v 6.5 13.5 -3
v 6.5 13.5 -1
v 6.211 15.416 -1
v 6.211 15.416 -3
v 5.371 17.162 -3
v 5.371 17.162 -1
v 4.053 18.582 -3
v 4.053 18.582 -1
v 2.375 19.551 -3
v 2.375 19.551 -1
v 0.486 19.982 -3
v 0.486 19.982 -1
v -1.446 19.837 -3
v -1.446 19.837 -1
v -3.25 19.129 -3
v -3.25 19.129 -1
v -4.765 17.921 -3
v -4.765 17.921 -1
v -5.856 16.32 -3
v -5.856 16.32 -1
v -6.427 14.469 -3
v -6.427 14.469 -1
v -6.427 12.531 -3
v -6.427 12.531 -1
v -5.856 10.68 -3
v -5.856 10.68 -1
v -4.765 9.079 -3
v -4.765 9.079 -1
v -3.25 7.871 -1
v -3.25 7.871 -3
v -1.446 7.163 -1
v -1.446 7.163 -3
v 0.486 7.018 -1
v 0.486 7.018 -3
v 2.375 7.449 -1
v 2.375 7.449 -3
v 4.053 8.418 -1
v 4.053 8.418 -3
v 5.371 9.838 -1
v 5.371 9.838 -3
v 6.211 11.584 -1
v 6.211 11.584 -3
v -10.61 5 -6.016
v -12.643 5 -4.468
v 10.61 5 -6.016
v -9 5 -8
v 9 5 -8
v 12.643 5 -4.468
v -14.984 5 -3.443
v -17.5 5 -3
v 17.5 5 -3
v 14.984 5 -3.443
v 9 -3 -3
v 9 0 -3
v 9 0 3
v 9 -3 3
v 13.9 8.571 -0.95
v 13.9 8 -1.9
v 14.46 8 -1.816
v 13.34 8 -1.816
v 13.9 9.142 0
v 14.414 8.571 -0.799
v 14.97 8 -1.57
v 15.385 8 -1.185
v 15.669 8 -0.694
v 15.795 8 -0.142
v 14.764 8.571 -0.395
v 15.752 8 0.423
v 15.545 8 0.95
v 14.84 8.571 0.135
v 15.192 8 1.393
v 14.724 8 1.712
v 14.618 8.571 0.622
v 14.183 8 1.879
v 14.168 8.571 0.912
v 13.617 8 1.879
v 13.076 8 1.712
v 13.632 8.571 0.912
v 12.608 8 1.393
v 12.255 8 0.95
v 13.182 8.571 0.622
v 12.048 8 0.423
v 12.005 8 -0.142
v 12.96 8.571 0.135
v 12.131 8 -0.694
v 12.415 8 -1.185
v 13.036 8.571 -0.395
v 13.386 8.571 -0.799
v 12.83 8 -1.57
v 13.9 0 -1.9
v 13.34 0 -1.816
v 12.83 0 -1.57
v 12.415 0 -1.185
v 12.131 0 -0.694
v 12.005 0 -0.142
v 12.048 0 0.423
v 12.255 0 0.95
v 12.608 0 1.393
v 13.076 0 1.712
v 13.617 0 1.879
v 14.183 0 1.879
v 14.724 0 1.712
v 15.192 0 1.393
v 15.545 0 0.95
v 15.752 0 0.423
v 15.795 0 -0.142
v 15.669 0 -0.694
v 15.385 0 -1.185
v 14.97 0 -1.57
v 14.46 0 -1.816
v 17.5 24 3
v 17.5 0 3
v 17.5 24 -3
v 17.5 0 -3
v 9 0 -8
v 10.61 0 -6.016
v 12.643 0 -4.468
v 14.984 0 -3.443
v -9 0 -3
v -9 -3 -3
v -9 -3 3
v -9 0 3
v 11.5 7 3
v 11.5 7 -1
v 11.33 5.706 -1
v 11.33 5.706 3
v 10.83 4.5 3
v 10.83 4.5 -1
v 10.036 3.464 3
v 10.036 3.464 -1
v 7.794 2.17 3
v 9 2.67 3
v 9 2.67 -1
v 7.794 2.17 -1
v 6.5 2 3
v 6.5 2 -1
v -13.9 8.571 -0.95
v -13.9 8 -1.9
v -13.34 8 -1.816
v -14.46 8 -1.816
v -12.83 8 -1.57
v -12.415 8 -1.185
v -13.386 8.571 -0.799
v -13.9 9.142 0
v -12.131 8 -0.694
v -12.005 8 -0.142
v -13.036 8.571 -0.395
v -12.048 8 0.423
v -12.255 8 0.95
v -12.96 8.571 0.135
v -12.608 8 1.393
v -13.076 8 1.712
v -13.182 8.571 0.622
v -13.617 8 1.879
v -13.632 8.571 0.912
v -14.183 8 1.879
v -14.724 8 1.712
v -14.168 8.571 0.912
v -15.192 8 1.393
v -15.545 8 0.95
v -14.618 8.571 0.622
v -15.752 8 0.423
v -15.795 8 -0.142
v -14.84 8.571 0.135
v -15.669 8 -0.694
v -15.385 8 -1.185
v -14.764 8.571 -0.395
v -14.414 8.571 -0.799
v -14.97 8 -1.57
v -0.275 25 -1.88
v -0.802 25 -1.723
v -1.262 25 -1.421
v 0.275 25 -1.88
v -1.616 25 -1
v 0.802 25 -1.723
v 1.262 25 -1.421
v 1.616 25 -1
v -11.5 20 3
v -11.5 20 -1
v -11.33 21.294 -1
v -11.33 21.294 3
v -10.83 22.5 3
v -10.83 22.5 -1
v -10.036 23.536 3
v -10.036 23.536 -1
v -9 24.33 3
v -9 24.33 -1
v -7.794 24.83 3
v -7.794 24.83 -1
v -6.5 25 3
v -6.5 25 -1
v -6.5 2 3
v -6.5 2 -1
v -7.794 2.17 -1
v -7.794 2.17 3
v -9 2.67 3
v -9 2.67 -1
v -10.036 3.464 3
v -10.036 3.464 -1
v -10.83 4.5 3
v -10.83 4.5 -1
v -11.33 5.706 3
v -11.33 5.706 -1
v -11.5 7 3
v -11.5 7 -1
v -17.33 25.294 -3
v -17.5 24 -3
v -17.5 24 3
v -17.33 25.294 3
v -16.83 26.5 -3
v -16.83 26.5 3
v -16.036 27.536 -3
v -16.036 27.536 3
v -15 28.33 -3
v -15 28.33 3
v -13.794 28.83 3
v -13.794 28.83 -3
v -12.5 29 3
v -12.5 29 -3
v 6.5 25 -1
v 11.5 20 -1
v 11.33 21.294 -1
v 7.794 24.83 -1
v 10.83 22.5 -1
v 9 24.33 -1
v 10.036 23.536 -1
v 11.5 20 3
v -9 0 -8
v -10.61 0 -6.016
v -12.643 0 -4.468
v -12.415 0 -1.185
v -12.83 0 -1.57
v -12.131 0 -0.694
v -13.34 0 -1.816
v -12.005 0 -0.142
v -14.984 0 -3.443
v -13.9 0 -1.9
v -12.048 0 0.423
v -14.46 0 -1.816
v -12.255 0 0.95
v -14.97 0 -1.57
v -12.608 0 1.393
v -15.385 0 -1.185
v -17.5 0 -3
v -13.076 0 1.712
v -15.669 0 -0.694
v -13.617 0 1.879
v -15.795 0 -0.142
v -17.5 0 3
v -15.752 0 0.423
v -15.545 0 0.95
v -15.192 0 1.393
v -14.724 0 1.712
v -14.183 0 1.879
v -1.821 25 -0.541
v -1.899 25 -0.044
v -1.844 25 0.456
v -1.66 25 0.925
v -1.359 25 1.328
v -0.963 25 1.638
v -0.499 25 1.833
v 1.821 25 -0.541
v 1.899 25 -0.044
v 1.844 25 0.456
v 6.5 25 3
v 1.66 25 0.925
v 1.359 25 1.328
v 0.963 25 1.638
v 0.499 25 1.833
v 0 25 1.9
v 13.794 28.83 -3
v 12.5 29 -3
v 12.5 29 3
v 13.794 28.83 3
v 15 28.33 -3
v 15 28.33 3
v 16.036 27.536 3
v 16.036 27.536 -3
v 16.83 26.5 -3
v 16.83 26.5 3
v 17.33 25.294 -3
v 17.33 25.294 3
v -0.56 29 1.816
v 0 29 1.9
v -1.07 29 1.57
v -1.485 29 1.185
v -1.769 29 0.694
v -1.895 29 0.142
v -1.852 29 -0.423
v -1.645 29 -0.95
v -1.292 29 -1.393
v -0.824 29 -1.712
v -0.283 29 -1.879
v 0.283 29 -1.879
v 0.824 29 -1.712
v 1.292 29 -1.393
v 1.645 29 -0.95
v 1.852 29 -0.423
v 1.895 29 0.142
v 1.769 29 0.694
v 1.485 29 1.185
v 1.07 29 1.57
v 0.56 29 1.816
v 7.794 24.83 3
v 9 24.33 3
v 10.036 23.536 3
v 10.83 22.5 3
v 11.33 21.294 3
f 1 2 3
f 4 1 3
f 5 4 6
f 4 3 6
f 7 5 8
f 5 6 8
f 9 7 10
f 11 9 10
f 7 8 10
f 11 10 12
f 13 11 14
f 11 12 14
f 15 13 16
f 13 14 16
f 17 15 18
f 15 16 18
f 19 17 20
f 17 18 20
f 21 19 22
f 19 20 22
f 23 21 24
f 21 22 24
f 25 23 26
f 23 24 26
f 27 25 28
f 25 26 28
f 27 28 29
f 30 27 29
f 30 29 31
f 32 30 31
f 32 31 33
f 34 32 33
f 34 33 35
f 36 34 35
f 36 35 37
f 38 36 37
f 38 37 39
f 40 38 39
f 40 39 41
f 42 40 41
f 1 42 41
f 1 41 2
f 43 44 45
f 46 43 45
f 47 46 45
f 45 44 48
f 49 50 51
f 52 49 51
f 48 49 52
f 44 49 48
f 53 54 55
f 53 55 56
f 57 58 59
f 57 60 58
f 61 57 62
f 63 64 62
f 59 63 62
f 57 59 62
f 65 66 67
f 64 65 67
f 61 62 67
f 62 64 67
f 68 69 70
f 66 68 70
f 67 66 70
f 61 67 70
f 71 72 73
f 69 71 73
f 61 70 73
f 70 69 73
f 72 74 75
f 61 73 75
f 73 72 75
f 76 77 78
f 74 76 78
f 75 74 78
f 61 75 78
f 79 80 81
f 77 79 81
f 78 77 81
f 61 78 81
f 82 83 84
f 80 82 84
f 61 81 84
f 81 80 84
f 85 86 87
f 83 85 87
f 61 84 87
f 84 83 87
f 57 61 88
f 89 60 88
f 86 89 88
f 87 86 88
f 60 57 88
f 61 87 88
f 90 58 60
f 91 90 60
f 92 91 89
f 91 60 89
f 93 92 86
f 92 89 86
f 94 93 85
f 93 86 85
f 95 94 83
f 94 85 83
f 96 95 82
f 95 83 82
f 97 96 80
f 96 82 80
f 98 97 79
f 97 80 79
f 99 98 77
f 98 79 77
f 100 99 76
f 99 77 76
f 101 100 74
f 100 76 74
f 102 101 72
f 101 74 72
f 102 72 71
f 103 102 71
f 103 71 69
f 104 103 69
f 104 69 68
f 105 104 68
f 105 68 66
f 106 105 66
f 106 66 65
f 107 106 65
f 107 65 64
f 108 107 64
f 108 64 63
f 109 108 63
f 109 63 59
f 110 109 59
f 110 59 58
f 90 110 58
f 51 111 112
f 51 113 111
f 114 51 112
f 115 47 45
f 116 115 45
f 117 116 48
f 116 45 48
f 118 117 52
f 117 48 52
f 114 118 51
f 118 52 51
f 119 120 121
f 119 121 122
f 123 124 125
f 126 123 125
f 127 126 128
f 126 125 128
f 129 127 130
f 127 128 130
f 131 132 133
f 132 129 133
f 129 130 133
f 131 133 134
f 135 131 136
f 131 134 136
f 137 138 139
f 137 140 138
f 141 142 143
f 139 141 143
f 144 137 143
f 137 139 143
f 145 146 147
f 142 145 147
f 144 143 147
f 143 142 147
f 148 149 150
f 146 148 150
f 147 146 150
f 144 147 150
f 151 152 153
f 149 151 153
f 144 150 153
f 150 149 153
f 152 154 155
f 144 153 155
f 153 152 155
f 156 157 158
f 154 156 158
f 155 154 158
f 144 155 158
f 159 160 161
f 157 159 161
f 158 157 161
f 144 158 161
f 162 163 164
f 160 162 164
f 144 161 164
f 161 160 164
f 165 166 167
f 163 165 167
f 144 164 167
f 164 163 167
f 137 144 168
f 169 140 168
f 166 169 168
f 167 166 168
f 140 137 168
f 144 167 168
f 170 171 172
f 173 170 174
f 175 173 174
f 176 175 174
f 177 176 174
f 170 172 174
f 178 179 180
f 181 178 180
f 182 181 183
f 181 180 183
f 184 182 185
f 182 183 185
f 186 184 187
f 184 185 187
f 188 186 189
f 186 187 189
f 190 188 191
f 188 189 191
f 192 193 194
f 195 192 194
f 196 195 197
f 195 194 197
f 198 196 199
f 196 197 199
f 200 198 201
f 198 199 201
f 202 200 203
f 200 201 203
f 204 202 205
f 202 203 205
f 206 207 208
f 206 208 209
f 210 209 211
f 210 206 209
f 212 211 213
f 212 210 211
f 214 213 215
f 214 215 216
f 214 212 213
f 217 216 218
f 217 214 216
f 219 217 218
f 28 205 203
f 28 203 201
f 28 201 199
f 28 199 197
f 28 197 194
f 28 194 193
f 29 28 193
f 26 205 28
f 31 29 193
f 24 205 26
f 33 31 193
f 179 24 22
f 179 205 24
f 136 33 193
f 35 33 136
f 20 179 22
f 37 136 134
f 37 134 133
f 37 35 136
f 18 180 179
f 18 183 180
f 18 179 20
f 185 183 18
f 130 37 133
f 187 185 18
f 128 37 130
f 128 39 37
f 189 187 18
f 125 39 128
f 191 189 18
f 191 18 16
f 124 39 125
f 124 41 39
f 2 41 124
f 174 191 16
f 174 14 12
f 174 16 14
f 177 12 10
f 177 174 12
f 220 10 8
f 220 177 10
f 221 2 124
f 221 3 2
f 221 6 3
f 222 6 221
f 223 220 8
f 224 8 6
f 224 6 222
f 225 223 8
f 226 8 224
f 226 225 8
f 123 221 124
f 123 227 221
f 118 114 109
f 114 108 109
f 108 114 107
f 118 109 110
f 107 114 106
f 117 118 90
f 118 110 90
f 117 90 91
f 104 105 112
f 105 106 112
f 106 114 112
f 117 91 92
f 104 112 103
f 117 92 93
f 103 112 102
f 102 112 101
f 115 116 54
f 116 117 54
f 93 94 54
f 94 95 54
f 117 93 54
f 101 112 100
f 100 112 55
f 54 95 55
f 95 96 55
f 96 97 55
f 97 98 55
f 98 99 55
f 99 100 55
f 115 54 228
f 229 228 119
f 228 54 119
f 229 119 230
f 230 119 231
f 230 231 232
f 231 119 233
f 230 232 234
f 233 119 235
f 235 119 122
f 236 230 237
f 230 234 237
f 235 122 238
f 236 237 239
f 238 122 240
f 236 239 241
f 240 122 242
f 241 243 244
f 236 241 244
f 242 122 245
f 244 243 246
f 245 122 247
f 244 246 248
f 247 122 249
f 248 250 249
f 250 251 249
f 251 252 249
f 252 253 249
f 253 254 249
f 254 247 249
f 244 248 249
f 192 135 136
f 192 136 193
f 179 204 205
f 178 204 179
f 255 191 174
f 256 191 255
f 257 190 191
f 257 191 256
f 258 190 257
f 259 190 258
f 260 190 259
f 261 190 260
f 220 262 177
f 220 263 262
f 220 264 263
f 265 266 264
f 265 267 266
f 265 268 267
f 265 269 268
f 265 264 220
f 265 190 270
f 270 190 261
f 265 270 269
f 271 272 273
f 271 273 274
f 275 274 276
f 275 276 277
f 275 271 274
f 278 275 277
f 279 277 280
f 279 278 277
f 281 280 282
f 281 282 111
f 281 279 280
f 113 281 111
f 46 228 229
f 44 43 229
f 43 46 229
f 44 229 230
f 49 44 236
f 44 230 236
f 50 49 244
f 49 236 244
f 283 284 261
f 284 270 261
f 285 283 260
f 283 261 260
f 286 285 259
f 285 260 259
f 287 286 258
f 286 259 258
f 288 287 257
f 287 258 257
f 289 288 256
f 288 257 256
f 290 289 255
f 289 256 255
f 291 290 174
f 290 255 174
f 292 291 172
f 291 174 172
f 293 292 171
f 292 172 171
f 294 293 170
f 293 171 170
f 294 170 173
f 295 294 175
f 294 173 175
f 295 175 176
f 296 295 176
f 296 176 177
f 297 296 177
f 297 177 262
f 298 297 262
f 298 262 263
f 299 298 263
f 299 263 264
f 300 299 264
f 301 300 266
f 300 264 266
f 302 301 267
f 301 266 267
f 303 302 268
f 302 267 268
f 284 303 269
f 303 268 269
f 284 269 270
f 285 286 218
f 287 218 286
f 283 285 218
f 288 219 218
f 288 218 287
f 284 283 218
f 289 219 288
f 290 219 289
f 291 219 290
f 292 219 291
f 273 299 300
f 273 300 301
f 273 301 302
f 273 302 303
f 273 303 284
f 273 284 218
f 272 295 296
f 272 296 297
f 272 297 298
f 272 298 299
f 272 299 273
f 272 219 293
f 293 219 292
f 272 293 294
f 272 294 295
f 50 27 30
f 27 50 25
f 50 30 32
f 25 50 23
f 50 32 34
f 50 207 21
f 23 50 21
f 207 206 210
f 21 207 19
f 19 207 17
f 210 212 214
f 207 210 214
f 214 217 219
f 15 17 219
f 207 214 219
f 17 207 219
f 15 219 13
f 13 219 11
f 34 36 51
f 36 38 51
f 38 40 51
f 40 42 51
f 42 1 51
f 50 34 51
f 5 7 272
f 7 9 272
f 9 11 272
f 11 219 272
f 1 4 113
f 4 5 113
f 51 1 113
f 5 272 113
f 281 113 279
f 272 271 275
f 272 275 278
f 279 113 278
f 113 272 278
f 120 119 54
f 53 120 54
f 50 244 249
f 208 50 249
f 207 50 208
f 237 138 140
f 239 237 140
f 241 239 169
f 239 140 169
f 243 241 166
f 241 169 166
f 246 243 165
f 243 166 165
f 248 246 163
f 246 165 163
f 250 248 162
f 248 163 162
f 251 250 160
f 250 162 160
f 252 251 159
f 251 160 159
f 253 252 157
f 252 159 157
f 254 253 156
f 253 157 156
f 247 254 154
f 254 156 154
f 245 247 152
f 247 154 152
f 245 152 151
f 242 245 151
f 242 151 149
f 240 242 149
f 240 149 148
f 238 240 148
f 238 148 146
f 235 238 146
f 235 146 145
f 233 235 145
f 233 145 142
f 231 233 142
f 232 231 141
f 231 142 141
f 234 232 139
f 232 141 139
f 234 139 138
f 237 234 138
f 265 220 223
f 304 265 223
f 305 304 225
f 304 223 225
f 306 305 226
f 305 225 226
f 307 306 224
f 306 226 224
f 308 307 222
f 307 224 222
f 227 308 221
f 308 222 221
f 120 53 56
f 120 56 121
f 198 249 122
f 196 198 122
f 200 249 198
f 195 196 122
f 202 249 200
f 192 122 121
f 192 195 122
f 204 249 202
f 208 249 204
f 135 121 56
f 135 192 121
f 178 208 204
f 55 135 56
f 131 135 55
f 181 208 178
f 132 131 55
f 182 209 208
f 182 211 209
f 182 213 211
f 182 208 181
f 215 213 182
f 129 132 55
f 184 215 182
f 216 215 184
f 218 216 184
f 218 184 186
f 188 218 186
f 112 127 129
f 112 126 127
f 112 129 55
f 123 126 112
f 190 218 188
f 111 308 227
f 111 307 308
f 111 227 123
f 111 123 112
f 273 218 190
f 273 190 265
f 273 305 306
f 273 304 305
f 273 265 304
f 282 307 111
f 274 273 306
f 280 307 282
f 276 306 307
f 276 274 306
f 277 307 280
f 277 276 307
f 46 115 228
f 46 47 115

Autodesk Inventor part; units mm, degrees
ref_plane "YZ-Ebene" through (0, 0, 0) normal (1, 0, 0) x (0, 1, 0)
ref_plane "XZ-Ebene" through (0, 0, 0) normal (0, 1, 0) x (-1, 0, 0)
ref_plane "XY-Ebene" through (0, 0, 0) normal (0, 0, 1) x (1, 0, 0)
sketch "Skizze1" plane through (0, 0, 0) normal (0, 0, 1) x (1, 0, 0)
  line L0 (-17.5, 0) -> (-17.5, 29)
  line L1 (-17.5, 29) -> (17.5, 29)
  line L2 (17.5, 29) -> (17.5, 0)
  line L3 (17.5, 0) -> (9, 0)
  line L4 (9, 0) -> (9, -3)
  line L5 (9, -3) -> (-9, -3)
  line L6 (-9, -3) -> (-9, 0)
  line L7 (-9, 0) -> (-17.5, 0)
  point P0 (0, 0)
  point P1 (0, -3)
  point P2 (0, 29)
  point P3 (13.25, 0)
  dimension "d0" = 18
  dimension "d1" = 35
  dimension "d2" = 29
  dimension "d3" = 3
extrude "Extrusion1" add sketch "Skizze1" along normal mid plane 6
sketch "Skizze2" plane through (0, 0, 3) normal (0, 0, 1) x (1, 0, 0)
  line L0 (-11.5, 25) -> (11.5, 25)
  line L1 (11.5, 25) -> (11.5, 2)
  line L2 (11.5, 2) -> (-11.5, 2)
  line L3 (-11.5, 2) -> (-11.5, 25)
  line L4 (-11.5, 25) -> (11.5, 2) construction
  line L5 (11.5, 25) -> (-11.5, 2) construction
  line L6 (-9, -3) -> (9, -3) projected
  point P0 (0, 0)
  point P1 (0, 13.5)
  point P2 (0, 2)
  dimension "d27" = 16.5
  dimension "d28" = 23
extrude "Extrusion2" cut sketch "Skizze2" against normal blind 4
fillet "Rundung1" radius 5 6 edges at (-17.5, 29, 0) (17.5, 29, 0) (-11.5, 25, 1) (11.5, 25, 1) (11.5, 2, 1) (-11.5, 2, 1)
sketch "Skizze3" plane through (0, 0, -1) normal (0, 0, 1) x (1, 0, 0)
  circle A0 centre (0, 13.5) radius 6.5
  line L0 (-9, -3) -> (9, -3) construction
  line L1 (9, -3) -> (-9, -3) construction
  point P0 (0, 0)
  dimension "d12" = 13
  dimension "d13" = 16.5
extrude "Extrusion3" cut sketch "Skizze3" against normal through all
sketch "Skizze4" plane through (9, 0, 3) normal (0, -1, 0) x (1, 0, 0)
  line L0 (-22.9, -3) -> (-9, -3) construction
  line L1 (-9, -3) -> (4.9, -3) construction
  dimension "d19" = 27.8
hole "Bohrung1" at (-13.9, 0, 0) at (13.9, 0, 0) direction (0, 1, 0) diameter 3.8 depth 8 tip angle 118
sketch "Skizze5" plane through (0, 0, -3) normal (0, 0, -1) x (-1, 0, 0)
  line L0 (-9, -3) -> (-9, 0) projected
  line L1 (-9, 0) -> (9, 0)
  line L2 (9, 0) -> (9, 5)
  line L3 (9, 5) -> (-9, 5)
  line L4 (-9, 5) -> (-9, 0)
  point P0 (0, 0)
  dimension "d29" = 5
extrude "Extrusion4" add sketch "Skizze5" along normal blind 5
fillet "Rundung2" radius 10.75 2 edges at (9, 2.5, -3) (-9, 2.5, -3)
sketch "Skizze6" plane through (-12.5, 29, -3) normal (0, 1, 0) x (1, 0, 0)
  point P0 (12.5, -3)
hole "Bohrung2" at (0, 29, 0) direction (0, -1, 0) diameter 3.8 depth 4
properties part number "Endcap" material "ABS-Kunststoff"
